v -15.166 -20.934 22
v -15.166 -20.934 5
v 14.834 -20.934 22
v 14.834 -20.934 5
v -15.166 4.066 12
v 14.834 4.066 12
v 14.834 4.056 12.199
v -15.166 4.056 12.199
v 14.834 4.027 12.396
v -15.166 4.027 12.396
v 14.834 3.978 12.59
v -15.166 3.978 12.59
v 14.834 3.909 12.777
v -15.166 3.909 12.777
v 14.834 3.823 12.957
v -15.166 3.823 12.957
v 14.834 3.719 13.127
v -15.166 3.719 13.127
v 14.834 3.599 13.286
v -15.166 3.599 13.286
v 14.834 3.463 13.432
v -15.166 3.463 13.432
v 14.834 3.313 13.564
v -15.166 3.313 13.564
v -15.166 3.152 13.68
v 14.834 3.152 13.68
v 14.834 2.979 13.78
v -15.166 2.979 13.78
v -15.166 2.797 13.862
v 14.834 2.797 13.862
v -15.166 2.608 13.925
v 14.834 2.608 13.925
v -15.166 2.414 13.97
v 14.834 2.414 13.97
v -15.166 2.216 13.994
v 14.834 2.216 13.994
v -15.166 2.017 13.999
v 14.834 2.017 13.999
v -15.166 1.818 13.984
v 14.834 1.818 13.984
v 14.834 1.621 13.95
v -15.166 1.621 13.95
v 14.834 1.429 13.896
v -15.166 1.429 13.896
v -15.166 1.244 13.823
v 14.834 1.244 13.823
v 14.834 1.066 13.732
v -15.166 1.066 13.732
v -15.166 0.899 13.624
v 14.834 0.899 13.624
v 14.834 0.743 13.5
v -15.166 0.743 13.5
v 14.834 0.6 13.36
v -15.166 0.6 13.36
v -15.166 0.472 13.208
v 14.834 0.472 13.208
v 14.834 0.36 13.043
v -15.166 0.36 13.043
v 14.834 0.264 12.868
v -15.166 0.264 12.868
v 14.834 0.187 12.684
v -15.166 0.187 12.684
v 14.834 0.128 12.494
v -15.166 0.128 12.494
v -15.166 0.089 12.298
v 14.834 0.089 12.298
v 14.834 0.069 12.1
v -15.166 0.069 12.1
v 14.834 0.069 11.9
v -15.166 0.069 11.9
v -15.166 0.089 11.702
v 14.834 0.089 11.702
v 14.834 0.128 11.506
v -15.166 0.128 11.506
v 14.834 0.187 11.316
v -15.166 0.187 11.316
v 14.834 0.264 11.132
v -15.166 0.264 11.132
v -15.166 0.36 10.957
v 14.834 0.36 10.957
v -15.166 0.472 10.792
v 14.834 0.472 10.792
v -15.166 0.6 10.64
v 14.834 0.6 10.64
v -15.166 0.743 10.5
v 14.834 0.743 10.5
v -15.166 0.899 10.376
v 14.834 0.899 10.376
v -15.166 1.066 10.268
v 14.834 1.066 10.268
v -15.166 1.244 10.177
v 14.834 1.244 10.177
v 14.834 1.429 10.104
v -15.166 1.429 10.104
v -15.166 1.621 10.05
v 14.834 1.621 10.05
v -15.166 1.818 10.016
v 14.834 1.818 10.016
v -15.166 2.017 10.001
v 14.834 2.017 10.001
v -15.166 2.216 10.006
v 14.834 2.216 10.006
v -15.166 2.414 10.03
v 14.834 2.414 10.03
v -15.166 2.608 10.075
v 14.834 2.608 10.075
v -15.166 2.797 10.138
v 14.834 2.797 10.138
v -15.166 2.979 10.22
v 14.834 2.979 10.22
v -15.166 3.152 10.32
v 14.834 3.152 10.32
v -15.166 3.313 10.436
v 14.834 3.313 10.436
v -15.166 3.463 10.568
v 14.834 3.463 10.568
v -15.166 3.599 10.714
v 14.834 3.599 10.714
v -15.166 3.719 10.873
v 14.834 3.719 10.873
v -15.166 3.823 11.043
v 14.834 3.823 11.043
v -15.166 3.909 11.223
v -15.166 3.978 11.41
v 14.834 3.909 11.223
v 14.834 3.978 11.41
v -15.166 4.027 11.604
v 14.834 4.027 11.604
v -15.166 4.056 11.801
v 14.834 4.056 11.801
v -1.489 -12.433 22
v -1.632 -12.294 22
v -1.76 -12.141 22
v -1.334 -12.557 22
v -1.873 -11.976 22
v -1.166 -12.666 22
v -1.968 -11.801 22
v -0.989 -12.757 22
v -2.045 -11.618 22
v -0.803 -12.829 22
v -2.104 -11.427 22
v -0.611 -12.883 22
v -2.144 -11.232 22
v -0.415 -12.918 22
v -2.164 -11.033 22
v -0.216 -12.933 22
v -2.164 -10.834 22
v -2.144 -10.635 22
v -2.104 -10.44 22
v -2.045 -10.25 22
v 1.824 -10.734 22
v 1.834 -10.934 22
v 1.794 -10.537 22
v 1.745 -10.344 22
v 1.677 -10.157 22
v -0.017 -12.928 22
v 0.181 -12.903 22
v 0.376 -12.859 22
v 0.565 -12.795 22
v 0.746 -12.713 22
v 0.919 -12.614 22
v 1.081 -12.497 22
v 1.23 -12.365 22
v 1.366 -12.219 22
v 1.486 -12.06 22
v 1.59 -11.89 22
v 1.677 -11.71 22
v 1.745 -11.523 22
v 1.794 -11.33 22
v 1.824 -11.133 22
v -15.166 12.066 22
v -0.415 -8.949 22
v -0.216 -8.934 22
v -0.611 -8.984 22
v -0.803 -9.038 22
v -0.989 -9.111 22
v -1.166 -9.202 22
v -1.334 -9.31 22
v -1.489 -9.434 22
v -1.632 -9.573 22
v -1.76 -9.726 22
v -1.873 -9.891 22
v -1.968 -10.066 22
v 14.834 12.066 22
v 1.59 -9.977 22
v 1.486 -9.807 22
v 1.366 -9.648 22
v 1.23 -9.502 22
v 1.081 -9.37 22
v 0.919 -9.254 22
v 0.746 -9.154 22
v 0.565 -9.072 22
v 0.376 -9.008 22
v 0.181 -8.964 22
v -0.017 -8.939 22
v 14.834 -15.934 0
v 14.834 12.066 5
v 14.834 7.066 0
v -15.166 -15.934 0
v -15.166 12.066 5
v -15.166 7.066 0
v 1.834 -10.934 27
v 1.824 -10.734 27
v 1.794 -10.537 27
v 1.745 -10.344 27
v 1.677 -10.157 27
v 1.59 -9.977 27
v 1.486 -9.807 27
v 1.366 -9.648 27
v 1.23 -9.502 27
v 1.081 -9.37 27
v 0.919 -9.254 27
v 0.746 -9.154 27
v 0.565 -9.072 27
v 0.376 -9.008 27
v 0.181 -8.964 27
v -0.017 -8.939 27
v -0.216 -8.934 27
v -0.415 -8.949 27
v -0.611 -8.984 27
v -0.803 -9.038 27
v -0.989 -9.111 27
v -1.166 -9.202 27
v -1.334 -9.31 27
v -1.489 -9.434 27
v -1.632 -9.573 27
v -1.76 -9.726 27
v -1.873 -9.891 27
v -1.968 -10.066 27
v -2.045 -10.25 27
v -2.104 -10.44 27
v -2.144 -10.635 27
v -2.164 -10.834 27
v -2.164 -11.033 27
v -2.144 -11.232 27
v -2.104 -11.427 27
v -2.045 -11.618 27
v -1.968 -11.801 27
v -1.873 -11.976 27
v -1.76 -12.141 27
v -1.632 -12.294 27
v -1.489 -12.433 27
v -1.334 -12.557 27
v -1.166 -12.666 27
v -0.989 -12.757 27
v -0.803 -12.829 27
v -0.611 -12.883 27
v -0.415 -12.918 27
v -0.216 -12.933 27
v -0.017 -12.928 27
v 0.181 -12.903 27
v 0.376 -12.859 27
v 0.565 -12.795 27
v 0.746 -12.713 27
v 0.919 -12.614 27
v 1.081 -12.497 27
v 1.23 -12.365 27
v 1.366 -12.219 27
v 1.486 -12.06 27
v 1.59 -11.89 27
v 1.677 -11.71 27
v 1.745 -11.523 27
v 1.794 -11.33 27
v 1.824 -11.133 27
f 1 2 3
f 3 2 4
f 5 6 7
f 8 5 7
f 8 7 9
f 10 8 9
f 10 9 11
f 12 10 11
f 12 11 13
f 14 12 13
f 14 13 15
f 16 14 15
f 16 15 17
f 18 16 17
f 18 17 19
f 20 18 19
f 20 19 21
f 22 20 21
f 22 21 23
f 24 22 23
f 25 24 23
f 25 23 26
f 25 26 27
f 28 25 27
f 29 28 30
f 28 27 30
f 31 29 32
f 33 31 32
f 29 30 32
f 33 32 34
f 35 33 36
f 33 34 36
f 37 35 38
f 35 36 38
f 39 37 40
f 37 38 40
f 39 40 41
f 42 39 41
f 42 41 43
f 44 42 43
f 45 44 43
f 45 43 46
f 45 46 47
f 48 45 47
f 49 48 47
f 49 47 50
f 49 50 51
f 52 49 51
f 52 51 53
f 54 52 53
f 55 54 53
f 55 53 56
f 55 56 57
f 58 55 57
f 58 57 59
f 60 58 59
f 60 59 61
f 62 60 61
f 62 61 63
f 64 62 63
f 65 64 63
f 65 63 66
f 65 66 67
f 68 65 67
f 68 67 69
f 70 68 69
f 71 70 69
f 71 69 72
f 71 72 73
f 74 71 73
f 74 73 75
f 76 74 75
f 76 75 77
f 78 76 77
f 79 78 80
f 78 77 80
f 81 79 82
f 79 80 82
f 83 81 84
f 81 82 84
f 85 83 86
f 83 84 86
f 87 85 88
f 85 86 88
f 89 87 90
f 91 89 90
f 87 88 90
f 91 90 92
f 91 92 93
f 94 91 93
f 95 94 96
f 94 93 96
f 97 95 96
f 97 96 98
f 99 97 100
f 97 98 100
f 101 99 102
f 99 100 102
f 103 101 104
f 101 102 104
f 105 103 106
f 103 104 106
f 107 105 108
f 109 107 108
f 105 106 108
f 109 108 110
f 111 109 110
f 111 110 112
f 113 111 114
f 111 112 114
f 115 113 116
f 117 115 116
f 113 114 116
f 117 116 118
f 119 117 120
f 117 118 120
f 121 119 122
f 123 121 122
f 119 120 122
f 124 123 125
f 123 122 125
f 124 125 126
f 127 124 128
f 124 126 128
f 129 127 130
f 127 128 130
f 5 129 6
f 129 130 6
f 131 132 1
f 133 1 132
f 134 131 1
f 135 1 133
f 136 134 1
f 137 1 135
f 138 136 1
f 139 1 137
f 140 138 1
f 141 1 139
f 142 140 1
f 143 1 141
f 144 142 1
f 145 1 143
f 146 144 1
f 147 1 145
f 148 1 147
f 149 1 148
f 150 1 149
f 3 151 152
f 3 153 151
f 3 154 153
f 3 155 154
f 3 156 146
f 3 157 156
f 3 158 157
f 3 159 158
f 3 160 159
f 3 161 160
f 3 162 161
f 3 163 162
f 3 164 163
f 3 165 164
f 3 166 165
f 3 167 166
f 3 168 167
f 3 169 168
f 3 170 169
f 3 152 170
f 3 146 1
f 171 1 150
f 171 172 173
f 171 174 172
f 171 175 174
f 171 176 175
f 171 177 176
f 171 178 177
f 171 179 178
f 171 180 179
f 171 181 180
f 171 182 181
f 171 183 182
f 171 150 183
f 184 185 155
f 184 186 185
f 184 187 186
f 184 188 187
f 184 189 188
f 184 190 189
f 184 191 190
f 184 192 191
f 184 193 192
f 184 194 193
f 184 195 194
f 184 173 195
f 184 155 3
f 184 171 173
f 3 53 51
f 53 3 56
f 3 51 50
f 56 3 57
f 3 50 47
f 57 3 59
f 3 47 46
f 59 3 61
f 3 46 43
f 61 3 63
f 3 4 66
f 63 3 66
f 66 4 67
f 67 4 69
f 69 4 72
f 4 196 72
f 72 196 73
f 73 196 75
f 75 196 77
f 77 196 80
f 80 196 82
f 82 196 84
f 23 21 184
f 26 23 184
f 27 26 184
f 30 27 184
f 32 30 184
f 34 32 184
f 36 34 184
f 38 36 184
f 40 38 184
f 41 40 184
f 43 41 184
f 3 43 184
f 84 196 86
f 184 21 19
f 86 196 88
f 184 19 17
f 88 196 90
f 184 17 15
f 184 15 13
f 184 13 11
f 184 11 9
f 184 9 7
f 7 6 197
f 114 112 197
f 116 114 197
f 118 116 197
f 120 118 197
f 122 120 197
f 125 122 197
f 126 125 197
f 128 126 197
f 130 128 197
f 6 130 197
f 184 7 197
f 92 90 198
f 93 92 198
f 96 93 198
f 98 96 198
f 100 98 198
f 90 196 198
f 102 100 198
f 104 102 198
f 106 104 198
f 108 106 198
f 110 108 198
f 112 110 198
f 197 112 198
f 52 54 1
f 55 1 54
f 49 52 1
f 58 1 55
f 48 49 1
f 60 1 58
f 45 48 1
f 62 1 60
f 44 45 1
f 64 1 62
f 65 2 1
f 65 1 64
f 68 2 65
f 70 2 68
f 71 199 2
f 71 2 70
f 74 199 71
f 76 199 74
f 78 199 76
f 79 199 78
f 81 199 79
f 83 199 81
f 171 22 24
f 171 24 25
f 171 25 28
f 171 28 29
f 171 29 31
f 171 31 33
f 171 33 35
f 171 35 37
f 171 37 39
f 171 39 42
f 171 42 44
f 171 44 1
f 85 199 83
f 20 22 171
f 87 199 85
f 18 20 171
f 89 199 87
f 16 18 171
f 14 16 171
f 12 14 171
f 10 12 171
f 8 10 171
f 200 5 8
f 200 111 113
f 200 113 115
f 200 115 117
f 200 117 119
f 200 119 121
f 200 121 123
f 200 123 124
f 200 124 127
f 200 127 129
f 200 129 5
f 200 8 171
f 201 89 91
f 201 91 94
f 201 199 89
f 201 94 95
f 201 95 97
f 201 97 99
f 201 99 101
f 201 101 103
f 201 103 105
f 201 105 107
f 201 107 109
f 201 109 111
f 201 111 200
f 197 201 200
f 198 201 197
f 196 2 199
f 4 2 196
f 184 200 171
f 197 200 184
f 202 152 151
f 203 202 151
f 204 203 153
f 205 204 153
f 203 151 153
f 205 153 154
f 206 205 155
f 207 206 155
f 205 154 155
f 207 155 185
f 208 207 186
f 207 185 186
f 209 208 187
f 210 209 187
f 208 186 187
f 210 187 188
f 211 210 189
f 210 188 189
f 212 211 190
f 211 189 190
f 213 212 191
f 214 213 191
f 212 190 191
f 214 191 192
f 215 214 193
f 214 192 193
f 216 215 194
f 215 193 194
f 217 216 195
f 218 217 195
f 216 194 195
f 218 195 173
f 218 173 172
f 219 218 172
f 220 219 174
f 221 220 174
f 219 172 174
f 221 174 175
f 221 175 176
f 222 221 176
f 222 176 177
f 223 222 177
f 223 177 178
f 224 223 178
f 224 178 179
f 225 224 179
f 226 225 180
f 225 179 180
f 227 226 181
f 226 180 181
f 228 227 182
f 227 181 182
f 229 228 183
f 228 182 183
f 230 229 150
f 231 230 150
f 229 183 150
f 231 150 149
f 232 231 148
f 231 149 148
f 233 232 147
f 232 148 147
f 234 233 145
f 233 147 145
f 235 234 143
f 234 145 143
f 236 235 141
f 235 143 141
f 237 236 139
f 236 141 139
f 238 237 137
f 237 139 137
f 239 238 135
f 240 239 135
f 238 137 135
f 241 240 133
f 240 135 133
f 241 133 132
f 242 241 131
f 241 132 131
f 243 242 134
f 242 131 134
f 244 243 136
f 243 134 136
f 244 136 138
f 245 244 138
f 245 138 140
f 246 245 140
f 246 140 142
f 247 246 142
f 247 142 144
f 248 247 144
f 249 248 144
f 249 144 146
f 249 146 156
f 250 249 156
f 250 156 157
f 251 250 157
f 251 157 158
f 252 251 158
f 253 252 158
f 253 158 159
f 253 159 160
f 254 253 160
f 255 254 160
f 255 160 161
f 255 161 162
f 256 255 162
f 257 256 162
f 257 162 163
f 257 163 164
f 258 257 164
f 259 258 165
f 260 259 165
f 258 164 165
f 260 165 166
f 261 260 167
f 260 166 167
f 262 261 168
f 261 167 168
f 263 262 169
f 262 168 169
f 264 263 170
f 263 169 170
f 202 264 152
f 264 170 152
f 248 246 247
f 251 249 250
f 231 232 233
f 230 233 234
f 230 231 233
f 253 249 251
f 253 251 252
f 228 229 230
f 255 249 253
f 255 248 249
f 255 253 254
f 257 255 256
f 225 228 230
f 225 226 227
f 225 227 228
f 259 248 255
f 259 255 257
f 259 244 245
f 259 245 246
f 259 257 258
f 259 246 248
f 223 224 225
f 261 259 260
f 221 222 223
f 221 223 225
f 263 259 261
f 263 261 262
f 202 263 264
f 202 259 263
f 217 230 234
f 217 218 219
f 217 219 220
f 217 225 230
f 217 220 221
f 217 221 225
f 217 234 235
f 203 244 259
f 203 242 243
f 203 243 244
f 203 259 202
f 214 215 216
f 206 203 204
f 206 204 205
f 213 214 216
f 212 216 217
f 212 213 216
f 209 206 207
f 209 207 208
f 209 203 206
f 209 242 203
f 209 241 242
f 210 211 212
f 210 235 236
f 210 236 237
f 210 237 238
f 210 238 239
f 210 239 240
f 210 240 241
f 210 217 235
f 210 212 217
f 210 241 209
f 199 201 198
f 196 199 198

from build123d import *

# Parameters (mm, degrees)
CROQUIS1_W              = 30
CROQUIS1_H              = 33
SALIENTE_EXTRUIR1_DEPTH = 22
CHAFL_N1_SIZE           = 5
CHAFL_N2_SIZE           = 5
CROQUIS3_R              = 2
CORTAR_EXTRUIR1_DEPTH   = 35
CROQUIS2_R              = 2
SALIENTE_EXTRUIR2_DEPTH = 5


with BuildPart() as part:
    # Croquis1 → Saliente-Extruir1 (new body)
    with BuildSketch(Plane.XY):
        with Locations((-0.166051661, -4.433579336)):
            Rectangle(CROQUIS1_W, CROQUIS1_H)
    extrude(amount=SALIENTE_EXTRUIR1_DEPTH)

    # Chaflán1
    chafl_n1_edges = [part.edges().sort_by_distance(p)[0] for p in [
        (-0.166051661, 12.066420664, 0),
    ]]
    chamfer(chafl_n1_edges, length=CHAFL_N1_SIZE)

    # Chaflán2
    chafl_n2_edges = [part.edges().sort_by_distance(p)[0] for p in [
        (-0.166051661, -20.933579336, 0),
    ]]
    chamfer(chafl_n2_edges, length=CHAFL_N2_SIZE)

    # Croquis3 → Cortar-Extruir1 (cut)
    with BuildSketch(Plane(origin=(14.833948339, 0, 0), x_dir=(0, 0, -1), z_dir=(1, 0, 0))):
        with Locations(Location((-12, 2.066420664, 0), (0, 0, 90))):
            Circle(CROQUIS3_R)
    extrude(amount=-CORTAR_EXTRUIR1_DEPTH, mode=Mode.SUBTRACT)

    # Croquis2 → Saliente-Extruir2 (add)
    with BuildSketch(Plane.XY.offset(22)):
        with Locations((-0.166051661, -10.933579336)):
            Circle(CROQUIS2_R)
    extrude(amount=SALIENTE_EXTRUIR2_DEPTH)


solid = part.part
